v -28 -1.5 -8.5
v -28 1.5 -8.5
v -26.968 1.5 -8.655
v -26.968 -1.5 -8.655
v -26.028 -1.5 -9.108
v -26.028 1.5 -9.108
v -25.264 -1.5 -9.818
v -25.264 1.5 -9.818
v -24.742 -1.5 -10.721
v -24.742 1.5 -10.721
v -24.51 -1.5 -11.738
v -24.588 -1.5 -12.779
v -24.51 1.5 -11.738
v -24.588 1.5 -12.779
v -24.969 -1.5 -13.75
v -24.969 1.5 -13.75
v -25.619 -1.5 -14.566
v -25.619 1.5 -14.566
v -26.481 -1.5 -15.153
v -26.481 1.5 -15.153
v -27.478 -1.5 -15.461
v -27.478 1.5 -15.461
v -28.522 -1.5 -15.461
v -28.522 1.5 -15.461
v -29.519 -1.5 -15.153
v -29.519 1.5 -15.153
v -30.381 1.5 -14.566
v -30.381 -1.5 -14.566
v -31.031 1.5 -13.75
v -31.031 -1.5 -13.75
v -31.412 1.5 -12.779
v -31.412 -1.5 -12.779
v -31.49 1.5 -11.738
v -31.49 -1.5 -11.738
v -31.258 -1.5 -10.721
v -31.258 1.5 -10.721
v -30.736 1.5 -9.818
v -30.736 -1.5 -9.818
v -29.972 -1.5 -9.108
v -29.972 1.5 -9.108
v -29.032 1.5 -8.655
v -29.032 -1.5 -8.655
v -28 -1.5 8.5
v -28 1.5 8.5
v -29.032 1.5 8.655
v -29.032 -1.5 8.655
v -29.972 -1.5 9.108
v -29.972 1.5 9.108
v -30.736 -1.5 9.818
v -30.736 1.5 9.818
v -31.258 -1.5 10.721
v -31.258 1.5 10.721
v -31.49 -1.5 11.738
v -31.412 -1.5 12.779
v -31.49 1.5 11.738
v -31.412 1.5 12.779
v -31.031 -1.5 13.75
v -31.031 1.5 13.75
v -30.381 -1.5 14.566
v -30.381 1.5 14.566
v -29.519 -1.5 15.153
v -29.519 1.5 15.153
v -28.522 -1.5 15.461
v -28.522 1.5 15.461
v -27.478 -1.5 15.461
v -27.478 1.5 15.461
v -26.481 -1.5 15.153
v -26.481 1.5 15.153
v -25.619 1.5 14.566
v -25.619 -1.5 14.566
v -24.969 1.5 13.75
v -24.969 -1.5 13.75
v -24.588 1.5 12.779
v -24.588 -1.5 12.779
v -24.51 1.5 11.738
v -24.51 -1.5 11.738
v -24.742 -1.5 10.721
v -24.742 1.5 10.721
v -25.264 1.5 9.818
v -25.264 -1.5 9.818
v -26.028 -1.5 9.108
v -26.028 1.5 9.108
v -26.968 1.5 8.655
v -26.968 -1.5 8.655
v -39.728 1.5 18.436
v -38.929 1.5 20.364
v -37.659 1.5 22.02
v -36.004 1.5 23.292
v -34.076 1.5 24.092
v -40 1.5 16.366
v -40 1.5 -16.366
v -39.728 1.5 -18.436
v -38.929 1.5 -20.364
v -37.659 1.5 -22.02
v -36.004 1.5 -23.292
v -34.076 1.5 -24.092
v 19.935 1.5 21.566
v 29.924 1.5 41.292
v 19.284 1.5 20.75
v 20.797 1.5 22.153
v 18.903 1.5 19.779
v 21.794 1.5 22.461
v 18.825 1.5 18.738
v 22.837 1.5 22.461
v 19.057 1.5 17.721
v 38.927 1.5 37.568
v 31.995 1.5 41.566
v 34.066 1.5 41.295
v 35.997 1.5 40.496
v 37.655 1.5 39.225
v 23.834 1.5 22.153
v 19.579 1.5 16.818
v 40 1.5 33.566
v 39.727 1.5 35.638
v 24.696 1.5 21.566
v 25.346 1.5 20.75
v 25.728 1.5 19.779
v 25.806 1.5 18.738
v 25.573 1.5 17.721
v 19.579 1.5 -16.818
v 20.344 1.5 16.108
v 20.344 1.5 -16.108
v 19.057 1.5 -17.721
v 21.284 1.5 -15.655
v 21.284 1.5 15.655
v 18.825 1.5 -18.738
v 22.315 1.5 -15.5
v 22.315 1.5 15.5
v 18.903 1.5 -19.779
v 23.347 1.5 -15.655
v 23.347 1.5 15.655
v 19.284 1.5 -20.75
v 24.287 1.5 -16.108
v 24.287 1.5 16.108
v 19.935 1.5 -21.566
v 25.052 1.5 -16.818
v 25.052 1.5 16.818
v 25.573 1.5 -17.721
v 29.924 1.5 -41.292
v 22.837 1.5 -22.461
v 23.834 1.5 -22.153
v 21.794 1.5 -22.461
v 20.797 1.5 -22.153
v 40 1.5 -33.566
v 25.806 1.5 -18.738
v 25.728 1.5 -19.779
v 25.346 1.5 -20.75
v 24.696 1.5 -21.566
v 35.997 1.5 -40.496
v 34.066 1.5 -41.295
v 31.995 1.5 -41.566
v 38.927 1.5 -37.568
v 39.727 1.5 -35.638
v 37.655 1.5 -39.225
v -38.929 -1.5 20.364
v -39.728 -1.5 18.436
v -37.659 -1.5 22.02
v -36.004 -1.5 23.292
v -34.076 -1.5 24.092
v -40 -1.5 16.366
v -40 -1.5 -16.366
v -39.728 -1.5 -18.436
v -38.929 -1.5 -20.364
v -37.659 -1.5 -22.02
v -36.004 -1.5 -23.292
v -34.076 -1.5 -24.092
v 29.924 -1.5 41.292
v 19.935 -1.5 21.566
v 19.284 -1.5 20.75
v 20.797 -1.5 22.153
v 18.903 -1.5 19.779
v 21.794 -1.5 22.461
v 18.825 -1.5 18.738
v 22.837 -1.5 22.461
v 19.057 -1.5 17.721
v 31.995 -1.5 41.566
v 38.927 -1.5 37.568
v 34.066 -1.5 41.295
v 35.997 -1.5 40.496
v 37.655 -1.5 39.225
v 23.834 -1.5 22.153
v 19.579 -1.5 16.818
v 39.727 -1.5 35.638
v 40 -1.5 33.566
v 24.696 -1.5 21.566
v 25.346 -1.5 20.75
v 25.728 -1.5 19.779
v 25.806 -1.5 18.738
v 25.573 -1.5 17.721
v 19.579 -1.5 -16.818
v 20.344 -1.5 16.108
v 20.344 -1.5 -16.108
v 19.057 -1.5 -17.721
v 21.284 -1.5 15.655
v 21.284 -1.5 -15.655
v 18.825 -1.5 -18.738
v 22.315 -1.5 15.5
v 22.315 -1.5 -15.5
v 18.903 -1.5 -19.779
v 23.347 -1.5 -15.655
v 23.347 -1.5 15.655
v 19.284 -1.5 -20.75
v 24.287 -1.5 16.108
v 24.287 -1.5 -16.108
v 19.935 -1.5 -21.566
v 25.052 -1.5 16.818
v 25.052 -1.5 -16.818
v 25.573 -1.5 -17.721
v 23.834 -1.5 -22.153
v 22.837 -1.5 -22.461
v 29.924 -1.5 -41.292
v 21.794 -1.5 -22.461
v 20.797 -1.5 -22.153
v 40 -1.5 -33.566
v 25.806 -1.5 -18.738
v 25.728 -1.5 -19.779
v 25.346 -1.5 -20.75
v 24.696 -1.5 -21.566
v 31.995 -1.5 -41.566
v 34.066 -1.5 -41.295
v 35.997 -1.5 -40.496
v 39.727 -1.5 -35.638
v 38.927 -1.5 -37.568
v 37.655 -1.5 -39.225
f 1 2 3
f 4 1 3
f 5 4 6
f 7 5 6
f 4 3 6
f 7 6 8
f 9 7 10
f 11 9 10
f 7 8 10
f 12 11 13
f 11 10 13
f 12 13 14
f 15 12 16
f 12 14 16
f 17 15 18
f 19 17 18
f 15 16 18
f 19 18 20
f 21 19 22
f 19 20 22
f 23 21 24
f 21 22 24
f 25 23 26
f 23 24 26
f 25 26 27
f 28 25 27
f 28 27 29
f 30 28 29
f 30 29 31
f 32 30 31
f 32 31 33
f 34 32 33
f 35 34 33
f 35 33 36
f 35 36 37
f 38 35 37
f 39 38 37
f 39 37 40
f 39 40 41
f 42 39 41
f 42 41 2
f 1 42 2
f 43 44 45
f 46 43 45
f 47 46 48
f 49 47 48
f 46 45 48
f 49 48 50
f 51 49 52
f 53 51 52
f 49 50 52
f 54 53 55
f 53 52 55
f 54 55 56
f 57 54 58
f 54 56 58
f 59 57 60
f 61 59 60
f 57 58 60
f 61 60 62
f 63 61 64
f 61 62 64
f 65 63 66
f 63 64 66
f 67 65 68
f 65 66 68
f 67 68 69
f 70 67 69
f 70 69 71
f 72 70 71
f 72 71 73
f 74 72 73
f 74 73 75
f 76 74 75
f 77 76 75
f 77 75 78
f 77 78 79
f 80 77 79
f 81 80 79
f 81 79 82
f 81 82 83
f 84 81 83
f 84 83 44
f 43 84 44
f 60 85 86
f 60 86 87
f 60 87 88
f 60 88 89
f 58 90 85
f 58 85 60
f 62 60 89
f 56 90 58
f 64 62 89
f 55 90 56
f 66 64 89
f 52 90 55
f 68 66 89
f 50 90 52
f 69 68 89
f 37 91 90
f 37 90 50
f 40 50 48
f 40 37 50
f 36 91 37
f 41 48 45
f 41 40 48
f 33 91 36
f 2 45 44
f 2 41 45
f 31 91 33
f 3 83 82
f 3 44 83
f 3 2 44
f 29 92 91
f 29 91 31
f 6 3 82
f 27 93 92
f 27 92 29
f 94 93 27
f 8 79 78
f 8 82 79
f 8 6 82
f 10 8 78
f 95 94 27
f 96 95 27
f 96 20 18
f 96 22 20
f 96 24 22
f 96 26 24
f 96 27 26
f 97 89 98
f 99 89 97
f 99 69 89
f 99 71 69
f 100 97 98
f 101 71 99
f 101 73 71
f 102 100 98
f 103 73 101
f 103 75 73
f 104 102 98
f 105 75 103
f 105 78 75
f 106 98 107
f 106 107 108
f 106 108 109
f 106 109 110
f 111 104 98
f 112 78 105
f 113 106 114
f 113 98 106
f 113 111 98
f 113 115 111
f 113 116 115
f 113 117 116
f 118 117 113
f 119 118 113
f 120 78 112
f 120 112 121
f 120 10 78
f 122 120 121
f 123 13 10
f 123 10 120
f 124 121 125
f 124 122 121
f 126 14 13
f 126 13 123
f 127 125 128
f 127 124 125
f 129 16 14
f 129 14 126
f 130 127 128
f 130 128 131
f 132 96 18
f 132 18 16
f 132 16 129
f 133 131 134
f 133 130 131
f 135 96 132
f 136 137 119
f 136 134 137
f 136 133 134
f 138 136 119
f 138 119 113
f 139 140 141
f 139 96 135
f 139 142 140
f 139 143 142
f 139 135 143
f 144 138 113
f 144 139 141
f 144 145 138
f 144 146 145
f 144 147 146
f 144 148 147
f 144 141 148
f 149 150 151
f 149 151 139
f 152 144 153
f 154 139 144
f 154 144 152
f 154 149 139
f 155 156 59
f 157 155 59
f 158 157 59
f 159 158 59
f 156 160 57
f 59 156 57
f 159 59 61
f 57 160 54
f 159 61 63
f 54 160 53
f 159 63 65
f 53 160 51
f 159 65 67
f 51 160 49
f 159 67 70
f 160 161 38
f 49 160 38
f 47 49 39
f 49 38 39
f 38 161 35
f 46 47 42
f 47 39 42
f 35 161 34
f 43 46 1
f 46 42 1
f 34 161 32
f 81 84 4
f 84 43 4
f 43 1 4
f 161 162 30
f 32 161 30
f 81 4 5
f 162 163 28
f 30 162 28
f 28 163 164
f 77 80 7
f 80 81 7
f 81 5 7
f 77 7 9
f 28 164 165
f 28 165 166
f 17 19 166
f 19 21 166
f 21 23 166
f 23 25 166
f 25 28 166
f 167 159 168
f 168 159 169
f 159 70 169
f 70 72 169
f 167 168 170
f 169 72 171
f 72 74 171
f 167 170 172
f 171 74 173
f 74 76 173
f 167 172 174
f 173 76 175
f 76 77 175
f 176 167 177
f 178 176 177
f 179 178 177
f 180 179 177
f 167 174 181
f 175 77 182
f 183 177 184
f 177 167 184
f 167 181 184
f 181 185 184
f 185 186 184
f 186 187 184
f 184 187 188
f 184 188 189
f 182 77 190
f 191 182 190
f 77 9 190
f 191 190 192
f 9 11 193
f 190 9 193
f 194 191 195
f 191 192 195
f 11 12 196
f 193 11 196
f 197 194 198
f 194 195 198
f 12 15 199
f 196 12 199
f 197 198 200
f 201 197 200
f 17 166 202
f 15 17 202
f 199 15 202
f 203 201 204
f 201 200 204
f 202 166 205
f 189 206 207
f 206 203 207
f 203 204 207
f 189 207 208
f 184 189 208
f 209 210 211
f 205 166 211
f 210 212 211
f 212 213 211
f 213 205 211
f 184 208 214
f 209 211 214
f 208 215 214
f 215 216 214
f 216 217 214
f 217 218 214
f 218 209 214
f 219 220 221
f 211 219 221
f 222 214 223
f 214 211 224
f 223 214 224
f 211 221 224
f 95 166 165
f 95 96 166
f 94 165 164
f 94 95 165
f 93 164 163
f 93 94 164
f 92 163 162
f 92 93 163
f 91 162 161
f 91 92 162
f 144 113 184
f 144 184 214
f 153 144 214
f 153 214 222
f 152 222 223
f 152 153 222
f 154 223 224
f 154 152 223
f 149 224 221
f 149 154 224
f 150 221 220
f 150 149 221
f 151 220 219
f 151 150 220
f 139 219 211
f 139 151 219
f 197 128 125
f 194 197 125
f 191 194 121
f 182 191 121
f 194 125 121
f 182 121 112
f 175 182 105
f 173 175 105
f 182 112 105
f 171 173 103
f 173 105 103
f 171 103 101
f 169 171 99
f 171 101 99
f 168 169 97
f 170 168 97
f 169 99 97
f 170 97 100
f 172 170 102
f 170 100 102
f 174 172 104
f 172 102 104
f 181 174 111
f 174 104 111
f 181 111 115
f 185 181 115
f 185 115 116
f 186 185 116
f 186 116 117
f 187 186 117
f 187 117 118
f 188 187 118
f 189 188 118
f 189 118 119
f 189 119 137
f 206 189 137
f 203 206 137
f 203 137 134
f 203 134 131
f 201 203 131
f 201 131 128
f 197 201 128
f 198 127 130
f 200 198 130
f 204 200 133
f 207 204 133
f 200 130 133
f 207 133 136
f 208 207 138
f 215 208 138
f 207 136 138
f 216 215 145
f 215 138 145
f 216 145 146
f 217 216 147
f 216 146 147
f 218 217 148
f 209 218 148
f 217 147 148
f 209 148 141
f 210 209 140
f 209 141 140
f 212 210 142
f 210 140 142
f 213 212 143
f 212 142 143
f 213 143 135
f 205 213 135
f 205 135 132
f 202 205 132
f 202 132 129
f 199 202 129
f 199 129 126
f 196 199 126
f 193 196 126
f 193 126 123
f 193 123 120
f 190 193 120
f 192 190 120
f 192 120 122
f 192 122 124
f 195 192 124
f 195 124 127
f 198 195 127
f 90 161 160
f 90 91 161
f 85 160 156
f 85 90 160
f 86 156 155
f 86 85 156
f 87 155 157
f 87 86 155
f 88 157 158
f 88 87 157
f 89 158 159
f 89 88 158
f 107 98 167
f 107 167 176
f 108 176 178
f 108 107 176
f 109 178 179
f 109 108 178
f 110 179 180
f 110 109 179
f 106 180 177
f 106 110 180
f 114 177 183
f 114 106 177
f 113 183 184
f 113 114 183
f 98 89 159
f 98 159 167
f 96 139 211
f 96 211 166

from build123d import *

# Parameters (mm, degrees)
BOSS_EXTRUDE2_DEPTH = 1.5
SKETCH3_R           = 3.5
CUT_EXTRUDE1_DEPTH  = 58.764549458


with BuildPart() as part:
    # Sketch1 → Boss-Extrude2 (new, symmetric)
    with BuildSketch(Plane(origin=(0, 0, 0), x_dir=(1, 0, 0), z_dir=(0, 1, 0))):
        with BuildLine():
            Line((-40, 0), (-40, -16.366130131))
            ThreePointArc((-40, -16.366130131), (-38.348645293, -21.23385064), (-34.076324263, -24.091987854))
            Line((-34.076324263, -24.091987854), (29.923675737, -41.291987854))
            ThreePointArc((29.923675737, -41.291987854), (36.867720508, -39.914775424), (40, -33.566130131))
            Line((40, -33.566130131), (40, 0))
            Line((40, 0), (-40, 0))
        make_face()
        with BuildLine():
            Line((-40, 16.366130131), (-40, 0))
            Line((-40, 0), (40, 0))
            Line((40, 0), (40, 33.566130131))
            ThreePointArc((40, 33.566130131), (36.867720508, 39.914775424), (29.923675737, 41.291987854))
            Line((29.923675737, 41.291987854), (-34.076324263, 24.091987854))
            ThreePointArc((-34.076324263, 24.091987854), (-38.348645293, 21.23385064), (-40, 16.366130131))
        make_face()
    extrude(amount=BOSS_EXTRUDE2_DEPTH, both=True)

    # Sketch3 → Cut-Extrude1 (cut, through all)
    with BuildSketch(Plane(origin=(0, 1.5, 0), x_dir=(1, 0, 0), z_dir=(0, 1, 0))):
        with Locations(Location((22.315405196, 19, 0), (0, 0, 270))):
            Circle(SKETCH3_R)
        with Locations(Location((-28, 12, 0), (0, 0, 270))):
            Circle(SKETCH3_R)
        with Locations(Location((22.315405196, -19, 0), (0, 0, 90))):
            Circle(SKETCH3_R)
        with Locations(Location((-28, -12, 0), (0, 0, 90))):
            Circle(SKETCH3_R)
    extrude(amount=-CUT_EXTRUDE1_DEPTH, mode=Mode.SUBTRACT)


solid = part.part
